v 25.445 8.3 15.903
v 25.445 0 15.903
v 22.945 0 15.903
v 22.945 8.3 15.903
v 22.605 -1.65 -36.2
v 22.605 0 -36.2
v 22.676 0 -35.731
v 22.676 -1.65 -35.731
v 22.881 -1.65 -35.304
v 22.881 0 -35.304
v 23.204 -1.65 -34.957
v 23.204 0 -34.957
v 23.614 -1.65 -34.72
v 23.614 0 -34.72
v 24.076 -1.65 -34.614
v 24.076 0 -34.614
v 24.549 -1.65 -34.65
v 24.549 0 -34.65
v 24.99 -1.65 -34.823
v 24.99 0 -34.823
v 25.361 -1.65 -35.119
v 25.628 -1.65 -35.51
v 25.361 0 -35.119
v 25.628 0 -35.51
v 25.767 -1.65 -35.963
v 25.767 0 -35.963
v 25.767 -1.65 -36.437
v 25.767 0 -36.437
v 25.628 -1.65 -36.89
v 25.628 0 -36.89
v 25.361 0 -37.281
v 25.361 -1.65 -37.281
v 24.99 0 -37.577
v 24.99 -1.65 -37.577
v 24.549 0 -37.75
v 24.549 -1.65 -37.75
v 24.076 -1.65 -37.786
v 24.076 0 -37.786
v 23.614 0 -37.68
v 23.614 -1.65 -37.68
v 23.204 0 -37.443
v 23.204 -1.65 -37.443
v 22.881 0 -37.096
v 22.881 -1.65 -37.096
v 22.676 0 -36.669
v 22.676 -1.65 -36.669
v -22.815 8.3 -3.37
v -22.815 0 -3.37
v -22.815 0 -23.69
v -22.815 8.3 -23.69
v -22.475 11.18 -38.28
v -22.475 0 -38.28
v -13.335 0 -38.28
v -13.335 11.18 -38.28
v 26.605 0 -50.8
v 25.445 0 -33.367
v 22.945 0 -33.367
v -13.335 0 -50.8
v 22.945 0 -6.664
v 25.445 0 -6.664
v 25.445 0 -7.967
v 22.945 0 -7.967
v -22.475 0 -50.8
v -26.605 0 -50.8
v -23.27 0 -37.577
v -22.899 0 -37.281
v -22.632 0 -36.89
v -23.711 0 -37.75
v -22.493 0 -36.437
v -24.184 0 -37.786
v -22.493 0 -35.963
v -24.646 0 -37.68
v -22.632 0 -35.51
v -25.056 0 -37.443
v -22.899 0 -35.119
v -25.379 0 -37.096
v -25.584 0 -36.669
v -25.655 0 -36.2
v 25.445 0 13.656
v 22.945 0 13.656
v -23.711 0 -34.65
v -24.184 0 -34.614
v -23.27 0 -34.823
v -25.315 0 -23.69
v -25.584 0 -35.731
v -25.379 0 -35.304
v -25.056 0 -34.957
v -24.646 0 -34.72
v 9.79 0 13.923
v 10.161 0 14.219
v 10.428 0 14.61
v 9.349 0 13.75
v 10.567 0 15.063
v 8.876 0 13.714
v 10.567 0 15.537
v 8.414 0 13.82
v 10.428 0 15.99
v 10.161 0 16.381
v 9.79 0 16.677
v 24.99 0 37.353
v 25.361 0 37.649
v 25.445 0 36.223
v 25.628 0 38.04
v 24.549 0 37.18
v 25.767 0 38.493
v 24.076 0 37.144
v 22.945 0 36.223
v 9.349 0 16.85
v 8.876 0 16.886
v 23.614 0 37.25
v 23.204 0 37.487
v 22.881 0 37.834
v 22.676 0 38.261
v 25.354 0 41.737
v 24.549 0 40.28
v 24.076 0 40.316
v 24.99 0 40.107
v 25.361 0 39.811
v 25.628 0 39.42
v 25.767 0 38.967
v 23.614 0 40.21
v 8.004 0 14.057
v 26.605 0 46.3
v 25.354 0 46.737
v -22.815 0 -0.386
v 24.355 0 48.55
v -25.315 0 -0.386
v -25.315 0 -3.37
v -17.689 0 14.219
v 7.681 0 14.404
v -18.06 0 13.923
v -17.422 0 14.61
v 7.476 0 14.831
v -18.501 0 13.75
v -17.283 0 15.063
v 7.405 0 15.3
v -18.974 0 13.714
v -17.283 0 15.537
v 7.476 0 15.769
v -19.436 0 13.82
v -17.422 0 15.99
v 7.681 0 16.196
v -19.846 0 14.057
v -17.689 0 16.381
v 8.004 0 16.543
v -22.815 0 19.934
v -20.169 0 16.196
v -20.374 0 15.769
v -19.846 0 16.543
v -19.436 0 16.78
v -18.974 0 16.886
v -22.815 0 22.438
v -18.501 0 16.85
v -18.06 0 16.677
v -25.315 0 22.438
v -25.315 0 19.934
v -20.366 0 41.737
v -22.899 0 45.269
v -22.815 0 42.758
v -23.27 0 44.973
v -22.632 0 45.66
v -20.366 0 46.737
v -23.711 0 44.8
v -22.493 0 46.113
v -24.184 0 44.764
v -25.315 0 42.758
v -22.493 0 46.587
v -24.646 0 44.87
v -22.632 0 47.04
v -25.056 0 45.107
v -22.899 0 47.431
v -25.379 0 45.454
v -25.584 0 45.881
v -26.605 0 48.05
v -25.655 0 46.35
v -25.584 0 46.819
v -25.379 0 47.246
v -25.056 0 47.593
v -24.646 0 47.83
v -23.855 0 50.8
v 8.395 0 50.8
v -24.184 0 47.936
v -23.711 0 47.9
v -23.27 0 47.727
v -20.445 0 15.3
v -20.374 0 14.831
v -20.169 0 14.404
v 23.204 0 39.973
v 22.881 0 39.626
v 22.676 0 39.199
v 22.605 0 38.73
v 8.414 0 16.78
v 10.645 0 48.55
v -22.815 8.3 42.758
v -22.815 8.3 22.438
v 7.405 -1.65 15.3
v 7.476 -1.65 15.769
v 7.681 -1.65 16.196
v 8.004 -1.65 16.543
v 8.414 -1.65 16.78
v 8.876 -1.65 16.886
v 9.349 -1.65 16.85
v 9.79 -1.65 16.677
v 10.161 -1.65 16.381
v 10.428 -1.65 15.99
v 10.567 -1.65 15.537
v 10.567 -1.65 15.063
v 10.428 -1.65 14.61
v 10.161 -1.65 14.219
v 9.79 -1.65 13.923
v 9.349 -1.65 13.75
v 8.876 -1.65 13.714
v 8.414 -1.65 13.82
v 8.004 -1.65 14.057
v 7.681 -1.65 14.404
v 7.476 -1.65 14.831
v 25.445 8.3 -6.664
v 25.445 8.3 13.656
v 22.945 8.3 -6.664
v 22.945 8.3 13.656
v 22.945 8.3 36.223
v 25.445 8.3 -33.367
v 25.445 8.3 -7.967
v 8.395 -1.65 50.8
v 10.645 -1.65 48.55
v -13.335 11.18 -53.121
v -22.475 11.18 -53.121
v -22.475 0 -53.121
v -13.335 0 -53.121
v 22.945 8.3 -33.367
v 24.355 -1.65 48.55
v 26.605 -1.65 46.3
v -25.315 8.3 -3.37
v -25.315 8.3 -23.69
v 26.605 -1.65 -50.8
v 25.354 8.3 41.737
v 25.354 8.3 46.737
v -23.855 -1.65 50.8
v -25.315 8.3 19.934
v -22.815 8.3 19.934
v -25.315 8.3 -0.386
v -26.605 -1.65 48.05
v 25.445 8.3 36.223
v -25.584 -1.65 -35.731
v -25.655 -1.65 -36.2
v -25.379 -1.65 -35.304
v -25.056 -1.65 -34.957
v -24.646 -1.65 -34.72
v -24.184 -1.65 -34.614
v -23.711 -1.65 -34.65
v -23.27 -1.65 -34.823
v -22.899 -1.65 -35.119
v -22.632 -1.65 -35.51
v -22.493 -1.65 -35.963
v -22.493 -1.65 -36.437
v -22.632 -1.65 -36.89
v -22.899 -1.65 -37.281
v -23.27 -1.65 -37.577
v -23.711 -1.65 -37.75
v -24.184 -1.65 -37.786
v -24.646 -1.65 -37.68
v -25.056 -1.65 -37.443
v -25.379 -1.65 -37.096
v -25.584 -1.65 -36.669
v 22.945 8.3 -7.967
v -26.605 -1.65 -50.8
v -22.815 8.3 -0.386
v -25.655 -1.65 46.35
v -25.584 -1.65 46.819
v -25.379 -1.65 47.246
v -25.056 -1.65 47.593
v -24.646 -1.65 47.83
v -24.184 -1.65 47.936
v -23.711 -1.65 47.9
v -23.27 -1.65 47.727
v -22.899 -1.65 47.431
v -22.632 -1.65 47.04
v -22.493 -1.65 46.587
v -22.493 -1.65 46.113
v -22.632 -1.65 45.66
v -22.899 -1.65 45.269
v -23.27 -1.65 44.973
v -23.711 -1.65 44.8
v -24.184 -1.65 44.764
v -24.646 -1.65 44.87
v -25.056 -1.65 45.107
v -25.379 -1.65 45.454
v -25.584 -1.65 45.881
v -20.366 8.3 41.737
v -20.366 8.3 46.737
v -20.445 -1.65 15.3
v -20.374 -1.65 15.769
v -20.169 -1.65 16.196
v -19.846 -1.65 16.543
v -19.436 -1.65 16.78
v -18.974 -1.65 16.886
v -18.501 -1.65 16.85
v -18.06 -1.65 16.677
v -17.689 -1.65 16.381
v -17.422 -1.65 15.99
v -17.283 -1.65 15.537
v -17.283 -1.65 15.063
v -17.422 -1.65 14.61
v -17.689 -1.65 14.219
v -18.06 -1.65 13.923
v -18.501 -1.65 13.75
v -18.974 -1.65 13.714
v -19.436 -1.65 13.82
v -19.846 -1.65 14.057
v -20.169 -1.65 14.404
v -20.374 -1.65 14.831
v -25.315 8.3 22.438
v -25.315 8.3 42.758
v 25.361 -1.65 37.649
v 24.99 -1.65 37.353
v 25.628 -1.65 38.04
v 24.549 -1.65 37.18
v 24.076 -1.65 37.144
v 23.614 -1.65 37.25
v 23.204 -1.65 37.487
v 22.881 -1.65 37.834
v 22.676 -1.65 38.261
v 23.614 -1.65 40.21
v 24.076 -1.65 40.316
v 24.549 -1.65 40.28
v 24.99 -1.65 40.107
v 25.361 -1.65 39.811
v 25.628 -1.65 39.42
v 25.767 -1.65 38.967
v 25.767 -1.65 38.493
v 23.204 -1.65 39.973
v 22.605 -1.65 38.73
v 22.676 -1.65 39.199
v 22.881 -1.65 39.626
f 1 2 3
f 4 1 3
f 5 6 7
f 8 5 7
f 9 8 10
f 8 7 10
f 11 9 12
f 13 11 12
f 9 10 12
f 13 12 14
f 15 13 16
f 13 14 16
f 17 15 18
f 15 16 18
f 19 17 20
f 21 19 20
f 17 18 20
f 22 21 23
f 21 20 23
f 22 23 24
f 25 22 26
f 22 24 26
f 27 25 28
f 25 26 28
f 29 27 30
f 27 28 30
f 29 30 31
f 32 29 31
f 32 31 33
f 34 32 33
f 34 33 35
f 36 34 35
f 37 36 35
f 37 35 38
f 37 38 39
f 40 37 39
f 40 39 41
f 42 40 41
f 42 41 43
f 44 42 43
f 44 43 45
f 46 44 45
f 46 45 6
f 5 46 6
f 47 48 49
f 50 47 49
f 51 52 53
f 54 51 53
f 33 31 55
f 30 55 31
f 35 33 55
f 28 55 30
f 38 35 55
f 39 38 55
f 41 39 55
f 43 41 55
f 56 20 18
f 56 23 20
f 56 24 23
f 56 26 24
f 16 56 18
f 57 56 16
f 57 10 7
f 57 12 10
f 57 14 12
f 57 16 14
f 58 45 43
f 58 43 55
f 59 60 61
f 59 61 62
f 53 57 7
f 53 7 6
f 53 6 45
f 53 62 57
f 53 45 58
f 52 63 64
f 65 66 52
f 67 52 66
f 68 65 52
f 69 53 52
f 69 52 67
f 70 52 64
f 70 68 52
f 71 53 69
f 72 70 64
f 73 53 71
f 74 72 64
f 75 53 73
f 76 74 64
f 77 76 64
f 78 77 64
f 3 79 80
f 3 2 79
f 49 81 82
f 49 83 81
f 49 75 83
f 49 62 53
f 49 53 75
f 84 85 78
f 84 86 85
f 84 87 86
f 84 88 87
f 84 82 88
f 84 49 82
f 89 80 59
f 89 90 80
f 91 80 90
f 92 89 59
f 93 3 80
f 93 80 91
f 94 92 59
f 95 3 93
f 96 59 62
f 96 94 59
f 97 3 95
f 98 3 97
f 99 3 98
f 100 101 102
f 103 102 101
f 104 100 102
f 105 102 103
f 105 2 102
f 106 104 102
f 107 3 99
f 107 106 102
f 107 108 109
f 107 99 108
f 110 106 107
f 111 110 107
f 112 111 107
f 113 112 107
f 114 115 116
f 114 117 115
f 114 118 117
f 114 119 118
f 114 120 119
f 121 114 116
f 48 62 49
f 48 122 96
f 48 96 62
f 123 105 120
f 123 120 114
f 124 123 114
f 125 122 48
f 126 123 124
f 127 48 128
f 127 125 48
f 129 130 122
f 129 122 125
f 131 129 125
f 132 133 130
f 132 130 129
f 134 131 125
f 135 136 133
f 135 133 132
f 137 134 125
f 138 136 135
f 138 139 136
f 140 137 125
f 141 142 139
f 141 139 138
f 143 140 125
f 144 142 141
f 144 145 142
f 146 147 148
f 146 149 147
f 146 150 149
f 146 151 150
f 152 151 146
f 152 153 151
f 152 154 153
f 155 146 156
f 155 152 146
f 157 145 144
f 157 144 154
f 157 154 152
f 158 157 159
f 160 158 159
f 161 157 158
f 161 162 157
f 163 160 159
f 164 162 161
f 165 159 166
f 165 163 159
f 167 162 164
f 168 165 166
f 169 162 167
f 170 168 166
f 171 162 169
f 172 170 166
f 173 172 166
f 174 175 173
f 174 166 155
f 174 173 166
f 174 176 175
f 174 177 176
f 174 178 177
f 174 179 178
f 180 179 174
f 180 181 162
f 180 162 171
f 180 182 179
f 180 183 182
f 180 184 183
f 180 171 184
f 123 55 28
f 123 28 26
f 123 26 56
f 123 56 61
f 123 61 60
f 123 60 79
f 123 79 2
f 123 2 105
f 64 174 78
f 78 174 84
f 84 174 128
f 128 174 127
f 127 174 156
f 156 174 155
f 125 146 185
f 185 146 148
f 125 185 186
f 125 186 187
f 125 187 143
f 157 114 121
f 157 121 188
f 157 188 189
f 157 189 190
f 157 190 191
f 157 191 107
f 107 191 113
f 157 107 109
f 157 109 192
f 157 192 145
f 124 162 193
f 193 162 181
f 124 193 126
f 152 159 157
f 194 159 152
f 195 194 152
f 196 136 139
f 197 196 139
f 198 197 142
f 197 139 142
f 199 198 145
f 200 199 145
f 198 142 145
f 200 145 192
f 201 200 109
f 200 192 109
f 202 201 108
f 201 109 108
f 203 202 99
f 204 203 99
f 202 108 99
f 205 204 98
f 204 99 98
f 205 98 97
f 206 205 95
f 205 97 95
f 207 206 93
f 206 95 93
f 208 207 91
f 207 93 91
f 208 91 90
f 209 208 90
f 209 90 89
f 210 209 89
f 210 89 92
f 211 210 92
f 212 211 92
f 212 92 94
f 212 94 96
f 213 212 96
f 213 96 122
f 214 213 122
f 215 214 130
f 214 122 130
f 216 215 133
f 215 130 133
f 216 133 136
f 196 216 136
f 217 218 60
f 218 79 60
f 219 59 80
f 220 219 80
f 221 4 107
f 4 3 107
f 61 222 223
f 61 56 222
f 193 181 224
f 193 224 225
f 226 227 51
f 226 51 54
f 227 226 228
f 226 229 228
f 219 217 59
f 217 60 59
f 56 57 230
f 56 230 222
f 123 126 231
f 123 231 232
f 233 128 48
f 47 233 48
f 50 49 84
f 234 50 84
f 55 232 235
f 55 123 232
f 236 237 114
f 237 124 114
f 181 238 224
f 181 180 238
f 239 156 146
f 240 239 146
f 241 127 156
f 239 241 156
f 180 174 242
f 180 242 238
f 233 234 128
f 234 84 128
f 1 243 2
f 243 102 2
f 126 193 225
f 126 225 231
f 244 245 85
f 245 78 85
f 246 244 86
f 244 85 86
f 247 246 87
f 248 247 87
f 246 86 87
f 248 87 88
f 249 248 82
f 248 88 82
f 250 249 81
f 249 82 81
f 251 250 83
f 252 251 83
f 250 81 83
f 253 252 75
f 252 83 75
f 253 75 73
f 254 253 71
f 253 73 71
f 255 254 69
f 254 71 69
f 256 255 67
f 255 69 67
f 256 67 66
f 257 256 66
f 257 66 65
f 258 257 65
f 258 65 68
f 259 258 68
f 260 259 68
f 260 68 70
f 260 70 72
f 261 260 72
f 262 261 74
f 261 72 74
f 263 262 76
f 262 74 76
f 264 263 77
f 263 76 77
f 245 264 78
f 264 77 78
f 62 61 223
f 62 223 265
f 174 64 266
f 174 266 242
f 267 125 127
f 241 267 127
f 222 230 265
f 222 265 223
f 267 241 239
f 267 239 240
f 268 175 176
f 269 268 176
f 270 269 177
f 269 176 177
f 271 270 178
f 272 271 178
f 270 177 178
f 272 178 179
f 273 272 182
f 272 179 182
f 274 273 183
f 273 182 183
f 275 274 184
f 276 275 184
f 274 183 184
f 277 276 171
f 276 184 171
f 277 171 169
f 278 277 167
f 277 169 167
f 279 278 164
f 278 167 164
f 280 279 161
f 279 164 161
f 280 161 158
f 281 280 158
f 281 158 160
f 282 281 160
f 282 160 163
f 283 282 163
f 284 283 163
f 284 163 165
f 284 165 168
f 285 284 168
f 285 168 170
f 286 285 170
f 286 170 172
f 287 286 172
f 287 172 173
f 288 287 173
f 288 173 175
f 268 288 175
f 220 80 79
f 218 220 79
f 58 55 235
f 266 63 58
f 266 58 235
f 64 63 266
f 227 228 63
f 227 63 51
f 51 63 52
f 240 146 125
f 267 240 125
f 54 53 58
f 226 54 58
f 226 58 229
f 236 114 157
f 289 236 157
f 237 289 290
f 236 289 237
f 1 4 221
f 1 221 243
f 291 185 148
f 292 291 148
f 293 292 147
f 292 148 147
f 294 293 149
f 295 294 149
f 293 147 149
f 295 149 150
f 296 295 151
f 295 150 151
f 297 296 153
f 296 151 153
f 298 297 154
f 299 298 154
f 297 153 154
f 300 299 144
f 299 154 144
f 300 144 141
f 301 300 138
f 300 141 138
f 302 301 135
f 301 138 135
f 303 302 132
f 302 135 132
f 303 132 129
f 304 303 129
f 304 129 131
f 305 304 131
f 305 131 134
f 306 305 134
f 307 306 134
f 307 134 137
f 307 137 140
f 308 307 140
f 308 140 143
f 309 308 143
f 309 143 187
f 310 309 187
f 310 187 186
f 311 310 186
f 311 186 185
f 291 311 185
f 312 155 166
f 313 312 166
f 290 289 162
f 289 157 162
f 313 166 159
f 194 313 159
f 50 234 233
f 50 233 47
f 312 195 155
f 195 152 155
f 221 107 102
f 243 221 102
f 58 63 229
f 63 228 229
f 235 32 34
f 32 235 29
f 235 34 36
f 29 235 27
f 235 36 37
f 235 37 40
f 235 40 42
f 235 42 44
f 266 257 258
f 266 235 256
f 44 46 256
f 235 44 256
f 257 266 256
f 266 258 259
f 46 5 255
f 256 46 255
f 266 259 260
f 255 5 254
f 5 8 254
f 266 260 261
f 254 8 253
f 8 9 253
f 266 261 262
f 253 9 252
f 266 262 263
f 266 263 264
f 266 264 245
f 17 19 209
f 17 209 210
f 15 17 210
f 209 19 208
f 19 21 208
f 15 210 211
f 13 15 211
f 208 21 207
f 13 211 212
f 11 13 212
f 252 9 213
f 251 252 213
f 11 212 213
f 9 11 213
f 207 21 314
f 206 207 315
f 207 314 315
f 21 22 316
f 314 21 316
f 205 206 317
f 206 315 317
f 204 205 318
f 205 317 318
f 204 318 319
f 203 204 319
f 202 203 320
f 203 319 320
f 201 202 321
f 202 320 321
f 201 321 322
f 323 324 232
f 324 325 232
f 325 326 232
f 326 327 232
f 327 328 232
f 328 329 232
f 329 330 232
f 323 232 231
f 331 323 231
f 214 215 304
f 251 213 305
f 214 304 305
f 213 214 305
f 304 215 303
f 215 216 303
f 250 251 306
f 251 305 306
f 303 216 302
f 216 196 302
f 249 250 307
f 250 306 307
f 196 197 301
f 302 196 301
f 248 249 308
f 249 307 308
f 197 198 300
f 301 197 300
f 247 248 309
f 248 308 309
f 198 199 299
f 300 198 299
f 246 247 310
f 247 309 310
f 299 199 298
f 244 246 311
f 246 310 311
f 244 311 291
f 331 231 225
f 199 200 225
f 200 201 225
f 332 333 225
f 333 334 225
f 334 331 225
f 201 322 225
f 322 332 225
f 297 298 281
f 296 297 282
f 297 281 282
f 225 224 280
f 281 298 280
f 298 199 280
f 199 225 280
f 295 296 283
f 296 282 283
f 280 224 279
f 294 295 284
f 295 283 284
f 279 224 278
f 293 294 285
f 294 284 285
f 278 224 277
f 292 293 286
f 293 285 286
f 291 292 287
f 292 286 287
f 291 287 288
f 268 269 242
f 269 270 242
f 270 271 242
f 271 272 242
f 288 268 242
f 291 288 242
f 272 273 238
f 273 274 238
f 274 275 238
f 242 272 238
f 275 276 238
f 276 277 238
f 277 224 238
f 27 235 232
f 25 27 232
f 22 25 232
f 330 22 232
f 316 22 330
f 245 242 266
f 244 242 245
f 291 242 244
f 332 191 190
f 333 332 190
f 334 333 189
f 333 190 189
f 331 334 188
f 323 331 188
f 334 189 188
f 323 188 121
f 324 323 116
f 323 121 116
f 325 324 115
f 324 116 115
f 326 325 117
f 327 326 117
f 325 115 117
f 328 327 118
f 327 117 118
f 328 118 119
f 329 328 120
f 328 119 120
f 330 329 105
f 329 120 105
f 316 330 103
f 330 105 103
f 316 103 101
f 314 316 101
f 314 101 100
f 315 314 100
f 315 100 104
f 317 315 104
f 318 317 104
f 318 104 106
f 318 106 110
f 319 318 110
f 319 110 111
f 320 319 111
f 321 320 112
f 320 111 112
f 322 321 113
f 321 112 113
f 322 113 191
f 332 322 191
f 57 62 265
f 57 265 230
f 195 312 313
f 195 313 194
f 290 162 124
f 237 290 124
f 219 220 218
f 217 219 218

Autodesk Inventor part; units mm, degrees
ref_plane "YZ Plane" through (0, 0, 0) normal (1, 0, 0) x (0, 1, 0)
ref_plane "XZ Plane" through (0, 0, 0) normal (0, 1, 0) x (-1, 0, 0)
ref_plane "XY Plane" through (0, 0, 0) normal (0, 0, 1) x (1, 0, 0)
sketch "Sketch1" plane through (0, 0, 0) normal (0, 1, 0) x (-1, 0, 0)
  line L0 (-26.605, -50.8) -> (26.605, -50.8)
  line L1 (26.605, -50.8) -> (26.605, 48.05)
  line L2 (23.855, 50.8) -> (-8.395, 50.8)
  line L3 (-26.605, 46.3) -> (-26.605, -50.8)
  line L4 (26.605, 48.05) -> (23.855, 50.8)
  line L5 (-8.395, 50.8) -> (-10.645, 48.55)
  line L6 (-10.645, 48.55) -> (-24.355, 48.55)
  line L7 (-24.355, 48.55) -> (-26.605, 46.3)
  circle A0 centre (24.065, -36.2) radius 1.59
  circle A1 centre (18.855, 15.3) radius 1.59
  circle A2 centre (-24.195, 38.73) radius 1.59
  circle A3 centre (24.065, 46.35) radius 1.59
  circle A4 centre (-8.995, 15.3) radius 1.59
  circle A5 centre (-24.195, -36.2) radius 1.59
  line L8 (24.065, -36.2) -> (24.065, 46.35) construction
  line L9 (24.065, -36.2) -> (-24.195, -36.2) construction
  line L10 (-24.195, -36.2) -> (-24.195, 38.73) construction
  line L11 (18.855, 15.3) -> (-8.995, 15.3) construction
  point P0 (0, 0)
  dimension "d4" = 2.25
  dimension "d5" = 45
  dimension "d6" = 2.25
  dimension "d7" = 45
  dimension "d8" = 2.75
  dimension "d9" = 35
  dimension "d10" = 53.21
  dimension "d11" = 101.6
  dimension "d12" = 50.8
  dimension "d13" = 26.605
  dimension "d14" = 2.54
  dimension "d15" = 7.75
  dimension "d16" = 82.55
  dimension "d17" = 74.93
  dimension "d18" = 48.26
  dimension "d19" = 66.1
  dimension "d20" = 3.18
  dimension "d21" = 27.85
  dimension "d22" = 14.6
extrude "Extrusion1" add sketch "Sketch1" against normal blind 1.65
sketch "Sketch2" plane through (0, 0, 0) normal (0, 1, 0) x (1, 0, 0)
  circle A0 centre (24.195, 36.2) radius 1.59 projected
  circle A1 centre (8.995, -15.3) radius 1.59 projected
  circle A2 centre (-24.065, -46.35) radius 1.59 projected
  circle A3 centre (24.195, -38.73) radius 1.59 projected
  circle A4 centre (-18.855, -15.3) radius 1.59 projected
  circle A5 centre (-24.065, 36.2) radius 1.59 projected
  line L0 (26.605, 50.8) -> (-26.605, 50.8) projected
  line L1 (-26.605, 50.8) -> (-26.605, -48.05) projected
  line L2 (-26.605, -48.05) -> (-23.855, -50.8) projected
  line L3 (-23.855, -50.8) -> (8.395, -50.8) projected
  line L4 (8.395, -50.8) -> (10.645, -48.55) projected
  line L5 (10.645, -48.55) -> (24.355, -48.55) projected
  line L6 (24.355, -48.55) -> (26.605, -46.3) projected
  line L7 (26.605, -46.3) -> (26.605, 50.8) projected
  circle A6 centre (24.195, 36.2) radius 1.59 projected
  line L8 (24.195, 36.2) -> (24.195, -38.73) construction
  line L9 (25.445, 7.9669) -> (22.945, 7.9669)
  line L10 (22.945, 7.9669) -> (22.945, 33.3669)
  line L11 (22.945, 33.3669) -> (25.445, 33.3669)
  line L12 (25.445, 33.3669) -> (25.445, 7.9669)
  line L13 (25.445, 7.9669) -> (22.945, 33.3669) construction
  line L14 (22.945, 7.9669) -> (25.445, 33.3669) construction
  line L15 (22.945, -13.6564) -> (25.445, -13.6564)
  line L16 (25.445, -13.6564) -> (25.445, 6.6636)
  line L17 (25.445, 6.6636) -> (22.945, 6.6636)
  line L18 (22.945, 6.6636) -> (22.945, -13.6564)
  line L19 (22.945, -13.6564) -> (25.445, 6.6636) construction
  line L20 (25.445, -13.6564) -> (22.945, 6.6636) construction
  line L21 (22.945, -36.2234) -> (25.445, -36.2234)
  line L22 (25.445, -36.2234) -> (25.445, -15.9034)
  line L23 (25.445, -15.9034) -> (22.945, -15.9034)
  line L24 (22.945, -15.9034) -> (22.945, -36.2234)
  line L25 (22.945, -36.2234) -> (25.445, -15.9034) construction
  line L26 (25.445, -36.2234) -> (22.945, -15.9034) construction
  line L27 (-20.3658, -46.7367) -> (25.3542, -46.7367)
  line L28 (25.3542, -46.7367) -> (25.3542, -41.7367)
  line L29 (25.3542, -41.7367) -> (-20.3658, -41.7367)
  line L30 (-20.3658, -41.7367) -> (-20.3658, -46.7367)
  line L31 (-20.3658, -46.7367) -> (25.3542, -41.7367) construction
  line L32 (25.3542, -46.7367) -> (-20.3658, -41.7367) construction
  circle A7 centre (-24.065, 36.2) radius 1.59 projected
  line L33 (-24.065, 36.2) -> (-24.065, -46.35) construction
  line L34 (-25.315, 3.37) -> (-22.815, 3.37)
  line L35 (-22.815, 3.37) -> (-22.815, 23.69)
  line L36 (-22.815, 23.69) -> (-25.315, 23.69)
  line L37 (-25.315, 23.69) -> (-25.315, 3.37)
  line L38 (-25.315, 3.37) -> (-22.815, 23.69) construction
  line L39 (-22.815, 3.37) -> (-25.315, 23.69) construction
  line L40 (-25.315, -19.9342) -> (-22.815, -19.9342)
  line L41 (-22.815, -19.9342) -> (-22.815, 0.3858)
  line L42 (-22.815, 0.3858) -> (-25.315, 0.3858)
  line L43 (-25.315, 0.3858) -> (-25.315, -19.9342)
  line L44 (-25.315, -19.9342) -> (-22.815, 0.3858) construction
  line L45 (-22.815, -19.9342) -> (-25.315, 0.3858) construction
  line L46 (-25.315, -42.7584) -> (-22.815, -42.7584)
  line L47 (-22.815, -42.7584) -> (-22.815, -22.4384)
  line L48 (-22.815, -22.4384) -> (-25.315, -22.4384)
  line L49 (-25.315, -22.4384) -> (-25.315, -42.7584)
  line L50 (-25.315, -42.7584) -> (-22.815, -22.4384) construction
  line L51 (-22.815, -42.7584) -> (-25.315, -22.4384) construction
  point P0 (0, 0)
  point P1 (24.195, 20.6669)
  point P2 (24.195, -3.4964)
  point P3 (24.195, -26.0634)
  point P4 (2.4942, -44.2367)
  point P5 (-24.065, 13.53)
  point P6 (-24.065, -9.7742)
  point P7 (-24.065, -32.5984)
  dimension "d23" = 25.4
  dimension "d24" = 20.32
  dimension "d25" = 2.5
  dimension "d26" = 20.32
  dimension "d27" = 5
  dimension "d28" = 45.72
  dimension "d29" = 20.32
  dimension "d30" = 20.32
  dimension "d31" = 20.32
extrude "Extrusion2" add sketch "Sketch2" along normal blind 8.3 contours L9 L10 L11 L12 | L18 L17 L16 L15 | L24 L23 L22 L21 | L30 L29 L28 L27 | L37 L36 L35 L34 | L43 L42 L41 L40 | L49 L48 L47 L46
sketch "Sketch3" plane through (0, 0, 0) normal (0, 1, 0) x (1, 0, 0)
  line L0 (22.945, 7.9669) -> (22.945, 33.3669) projected
  line L1 (22.945, 33.3669) -> (25.445, 33.3669) projected
  line L2 (25.445, 33.3669) -> (25.445, 7.9669) projected
  line L3 (25.445, 7.9669) -> (22.945, 7.9669) projected
  line L4 (-25.315, -19.9342) -> (-25.315, 0.3858) projected
  line L5 (-25.315, 0.3858) -> (-22.815, 0.3858) projected
  line L6 (-22.815, 0.3858) -> (-22.815, -19.9342) projected
  line L7 (-22.815, -19.9342) -> (-25.315, -19.9342) projected
  line L8 (22.945, -36.2234) -> (22.945, -15.9034) projected
  line L9 (22.945, -15.9034) -> (25.445, -15.9034) projected
  line L10 (25.445, -15.9034) -> (25.445, -36.2234) projected
  line L11 (25.445, -36.2234) -> (22.945, -36.2234) projected
  line L12 (22.945, -13.6564) -> (22.945, 6.6636) projected
  line L13 (22.945, 6.6636) -> (25.445, 6.6636) projected
  line L14 (25.445, 6.6636) -> (25.445, -13.6564) projected
  line L15 (25.445, -13.6564) -> (22.945, -13.6564) projected
  line L16 (-25.315, 3.37) -> (-25.315, 23.69) projected
  line L17 (-25.315, 23.69) -> (-22.815, 23.69) projected
  line L18 (-22.815, 23.69) -> (-22.815, 3.37) projected
  line L19 (-22.815, 3.37) -> (-25.315, 3.37) projected
  line L20 (-25.315, -42.7584) -> (-25.315, -22.4384) projected
  line L21 (-25.315, -22.4384) -> (-22.815, -22.4384) projected
  line L22 (-22.815, -22.4384) -> (-22.815, -42.7584) projected
  line L23 (-22.815, -42.7584) -> (-25.315, -42.7584) projected
  line L24 (-20.3658, -46.7367) -> (-20.3658, -41.7367) projected
  line L25 (-20.3658, -41.7367) -> (25.3542, -41.7367) projected
  line L26 (25.3542, -41.7367) -> (25.3542, -46.7367) projected
  line L27 (25.3542, -46.7367) -> (-20.3658, -46.7367) projected
  circle A0 centre (24.195, 36.2) radius 1.59 projected
  circle A1 centre (8.995, -15.3) radius 1.59 projected
  circle A2 centre (-24.065, -46.35) radius 1.59 projected
  circle A3 centre (24.195, -38.73) radius 1.59 projected
  circle A4 centre (-18.855, -15.3) radius 1.59 projected
  circle A5 centre (-24.065, 36.2) radius 1.59 projected
  line L28 (26.605, 50.8) -> (-26.605, 50.8) projected
  line L29 (-26.605, 50.8) -> (-26.605, -48.05) projected
  line L30 (-26.605, -48.05) -> (-23.855, -50.8) projected
  line L31 (-23.855, -50.8) -> (8.395, -50.8) projected
  line L32 (8.395, -50.8) -> (10.645, -48.55) projected
  line L33 (10.645, -48.55) -> (24.355, -48.55) projected
  line L34 (24.355, -48.55) -> (26.605, -46.3) projected
  line L35 (26.605, -46.3) -> (26.605, 50.8) projected
  line L36 (-13.335, 53.1213) -> (-22.475, 53.1213)
  line L37 (-22.475, 53.1213) -> (-22.475, 38.2805)
  line L38 (-22.475, 38.2805) -> (-13.335, 38.2805)
  line L39 (-13.335, 38.2805) -> (-13.335, 53.1213)
  point P0 (0, 0)
  dimension "d34" = 9.14
extrude "Extrusion3" add sketch "Sketch3" along normal blind 11.18 contours L39 L38 L37 L28 | L28 L37 L36 L39
properties part number "Arduino Due"
